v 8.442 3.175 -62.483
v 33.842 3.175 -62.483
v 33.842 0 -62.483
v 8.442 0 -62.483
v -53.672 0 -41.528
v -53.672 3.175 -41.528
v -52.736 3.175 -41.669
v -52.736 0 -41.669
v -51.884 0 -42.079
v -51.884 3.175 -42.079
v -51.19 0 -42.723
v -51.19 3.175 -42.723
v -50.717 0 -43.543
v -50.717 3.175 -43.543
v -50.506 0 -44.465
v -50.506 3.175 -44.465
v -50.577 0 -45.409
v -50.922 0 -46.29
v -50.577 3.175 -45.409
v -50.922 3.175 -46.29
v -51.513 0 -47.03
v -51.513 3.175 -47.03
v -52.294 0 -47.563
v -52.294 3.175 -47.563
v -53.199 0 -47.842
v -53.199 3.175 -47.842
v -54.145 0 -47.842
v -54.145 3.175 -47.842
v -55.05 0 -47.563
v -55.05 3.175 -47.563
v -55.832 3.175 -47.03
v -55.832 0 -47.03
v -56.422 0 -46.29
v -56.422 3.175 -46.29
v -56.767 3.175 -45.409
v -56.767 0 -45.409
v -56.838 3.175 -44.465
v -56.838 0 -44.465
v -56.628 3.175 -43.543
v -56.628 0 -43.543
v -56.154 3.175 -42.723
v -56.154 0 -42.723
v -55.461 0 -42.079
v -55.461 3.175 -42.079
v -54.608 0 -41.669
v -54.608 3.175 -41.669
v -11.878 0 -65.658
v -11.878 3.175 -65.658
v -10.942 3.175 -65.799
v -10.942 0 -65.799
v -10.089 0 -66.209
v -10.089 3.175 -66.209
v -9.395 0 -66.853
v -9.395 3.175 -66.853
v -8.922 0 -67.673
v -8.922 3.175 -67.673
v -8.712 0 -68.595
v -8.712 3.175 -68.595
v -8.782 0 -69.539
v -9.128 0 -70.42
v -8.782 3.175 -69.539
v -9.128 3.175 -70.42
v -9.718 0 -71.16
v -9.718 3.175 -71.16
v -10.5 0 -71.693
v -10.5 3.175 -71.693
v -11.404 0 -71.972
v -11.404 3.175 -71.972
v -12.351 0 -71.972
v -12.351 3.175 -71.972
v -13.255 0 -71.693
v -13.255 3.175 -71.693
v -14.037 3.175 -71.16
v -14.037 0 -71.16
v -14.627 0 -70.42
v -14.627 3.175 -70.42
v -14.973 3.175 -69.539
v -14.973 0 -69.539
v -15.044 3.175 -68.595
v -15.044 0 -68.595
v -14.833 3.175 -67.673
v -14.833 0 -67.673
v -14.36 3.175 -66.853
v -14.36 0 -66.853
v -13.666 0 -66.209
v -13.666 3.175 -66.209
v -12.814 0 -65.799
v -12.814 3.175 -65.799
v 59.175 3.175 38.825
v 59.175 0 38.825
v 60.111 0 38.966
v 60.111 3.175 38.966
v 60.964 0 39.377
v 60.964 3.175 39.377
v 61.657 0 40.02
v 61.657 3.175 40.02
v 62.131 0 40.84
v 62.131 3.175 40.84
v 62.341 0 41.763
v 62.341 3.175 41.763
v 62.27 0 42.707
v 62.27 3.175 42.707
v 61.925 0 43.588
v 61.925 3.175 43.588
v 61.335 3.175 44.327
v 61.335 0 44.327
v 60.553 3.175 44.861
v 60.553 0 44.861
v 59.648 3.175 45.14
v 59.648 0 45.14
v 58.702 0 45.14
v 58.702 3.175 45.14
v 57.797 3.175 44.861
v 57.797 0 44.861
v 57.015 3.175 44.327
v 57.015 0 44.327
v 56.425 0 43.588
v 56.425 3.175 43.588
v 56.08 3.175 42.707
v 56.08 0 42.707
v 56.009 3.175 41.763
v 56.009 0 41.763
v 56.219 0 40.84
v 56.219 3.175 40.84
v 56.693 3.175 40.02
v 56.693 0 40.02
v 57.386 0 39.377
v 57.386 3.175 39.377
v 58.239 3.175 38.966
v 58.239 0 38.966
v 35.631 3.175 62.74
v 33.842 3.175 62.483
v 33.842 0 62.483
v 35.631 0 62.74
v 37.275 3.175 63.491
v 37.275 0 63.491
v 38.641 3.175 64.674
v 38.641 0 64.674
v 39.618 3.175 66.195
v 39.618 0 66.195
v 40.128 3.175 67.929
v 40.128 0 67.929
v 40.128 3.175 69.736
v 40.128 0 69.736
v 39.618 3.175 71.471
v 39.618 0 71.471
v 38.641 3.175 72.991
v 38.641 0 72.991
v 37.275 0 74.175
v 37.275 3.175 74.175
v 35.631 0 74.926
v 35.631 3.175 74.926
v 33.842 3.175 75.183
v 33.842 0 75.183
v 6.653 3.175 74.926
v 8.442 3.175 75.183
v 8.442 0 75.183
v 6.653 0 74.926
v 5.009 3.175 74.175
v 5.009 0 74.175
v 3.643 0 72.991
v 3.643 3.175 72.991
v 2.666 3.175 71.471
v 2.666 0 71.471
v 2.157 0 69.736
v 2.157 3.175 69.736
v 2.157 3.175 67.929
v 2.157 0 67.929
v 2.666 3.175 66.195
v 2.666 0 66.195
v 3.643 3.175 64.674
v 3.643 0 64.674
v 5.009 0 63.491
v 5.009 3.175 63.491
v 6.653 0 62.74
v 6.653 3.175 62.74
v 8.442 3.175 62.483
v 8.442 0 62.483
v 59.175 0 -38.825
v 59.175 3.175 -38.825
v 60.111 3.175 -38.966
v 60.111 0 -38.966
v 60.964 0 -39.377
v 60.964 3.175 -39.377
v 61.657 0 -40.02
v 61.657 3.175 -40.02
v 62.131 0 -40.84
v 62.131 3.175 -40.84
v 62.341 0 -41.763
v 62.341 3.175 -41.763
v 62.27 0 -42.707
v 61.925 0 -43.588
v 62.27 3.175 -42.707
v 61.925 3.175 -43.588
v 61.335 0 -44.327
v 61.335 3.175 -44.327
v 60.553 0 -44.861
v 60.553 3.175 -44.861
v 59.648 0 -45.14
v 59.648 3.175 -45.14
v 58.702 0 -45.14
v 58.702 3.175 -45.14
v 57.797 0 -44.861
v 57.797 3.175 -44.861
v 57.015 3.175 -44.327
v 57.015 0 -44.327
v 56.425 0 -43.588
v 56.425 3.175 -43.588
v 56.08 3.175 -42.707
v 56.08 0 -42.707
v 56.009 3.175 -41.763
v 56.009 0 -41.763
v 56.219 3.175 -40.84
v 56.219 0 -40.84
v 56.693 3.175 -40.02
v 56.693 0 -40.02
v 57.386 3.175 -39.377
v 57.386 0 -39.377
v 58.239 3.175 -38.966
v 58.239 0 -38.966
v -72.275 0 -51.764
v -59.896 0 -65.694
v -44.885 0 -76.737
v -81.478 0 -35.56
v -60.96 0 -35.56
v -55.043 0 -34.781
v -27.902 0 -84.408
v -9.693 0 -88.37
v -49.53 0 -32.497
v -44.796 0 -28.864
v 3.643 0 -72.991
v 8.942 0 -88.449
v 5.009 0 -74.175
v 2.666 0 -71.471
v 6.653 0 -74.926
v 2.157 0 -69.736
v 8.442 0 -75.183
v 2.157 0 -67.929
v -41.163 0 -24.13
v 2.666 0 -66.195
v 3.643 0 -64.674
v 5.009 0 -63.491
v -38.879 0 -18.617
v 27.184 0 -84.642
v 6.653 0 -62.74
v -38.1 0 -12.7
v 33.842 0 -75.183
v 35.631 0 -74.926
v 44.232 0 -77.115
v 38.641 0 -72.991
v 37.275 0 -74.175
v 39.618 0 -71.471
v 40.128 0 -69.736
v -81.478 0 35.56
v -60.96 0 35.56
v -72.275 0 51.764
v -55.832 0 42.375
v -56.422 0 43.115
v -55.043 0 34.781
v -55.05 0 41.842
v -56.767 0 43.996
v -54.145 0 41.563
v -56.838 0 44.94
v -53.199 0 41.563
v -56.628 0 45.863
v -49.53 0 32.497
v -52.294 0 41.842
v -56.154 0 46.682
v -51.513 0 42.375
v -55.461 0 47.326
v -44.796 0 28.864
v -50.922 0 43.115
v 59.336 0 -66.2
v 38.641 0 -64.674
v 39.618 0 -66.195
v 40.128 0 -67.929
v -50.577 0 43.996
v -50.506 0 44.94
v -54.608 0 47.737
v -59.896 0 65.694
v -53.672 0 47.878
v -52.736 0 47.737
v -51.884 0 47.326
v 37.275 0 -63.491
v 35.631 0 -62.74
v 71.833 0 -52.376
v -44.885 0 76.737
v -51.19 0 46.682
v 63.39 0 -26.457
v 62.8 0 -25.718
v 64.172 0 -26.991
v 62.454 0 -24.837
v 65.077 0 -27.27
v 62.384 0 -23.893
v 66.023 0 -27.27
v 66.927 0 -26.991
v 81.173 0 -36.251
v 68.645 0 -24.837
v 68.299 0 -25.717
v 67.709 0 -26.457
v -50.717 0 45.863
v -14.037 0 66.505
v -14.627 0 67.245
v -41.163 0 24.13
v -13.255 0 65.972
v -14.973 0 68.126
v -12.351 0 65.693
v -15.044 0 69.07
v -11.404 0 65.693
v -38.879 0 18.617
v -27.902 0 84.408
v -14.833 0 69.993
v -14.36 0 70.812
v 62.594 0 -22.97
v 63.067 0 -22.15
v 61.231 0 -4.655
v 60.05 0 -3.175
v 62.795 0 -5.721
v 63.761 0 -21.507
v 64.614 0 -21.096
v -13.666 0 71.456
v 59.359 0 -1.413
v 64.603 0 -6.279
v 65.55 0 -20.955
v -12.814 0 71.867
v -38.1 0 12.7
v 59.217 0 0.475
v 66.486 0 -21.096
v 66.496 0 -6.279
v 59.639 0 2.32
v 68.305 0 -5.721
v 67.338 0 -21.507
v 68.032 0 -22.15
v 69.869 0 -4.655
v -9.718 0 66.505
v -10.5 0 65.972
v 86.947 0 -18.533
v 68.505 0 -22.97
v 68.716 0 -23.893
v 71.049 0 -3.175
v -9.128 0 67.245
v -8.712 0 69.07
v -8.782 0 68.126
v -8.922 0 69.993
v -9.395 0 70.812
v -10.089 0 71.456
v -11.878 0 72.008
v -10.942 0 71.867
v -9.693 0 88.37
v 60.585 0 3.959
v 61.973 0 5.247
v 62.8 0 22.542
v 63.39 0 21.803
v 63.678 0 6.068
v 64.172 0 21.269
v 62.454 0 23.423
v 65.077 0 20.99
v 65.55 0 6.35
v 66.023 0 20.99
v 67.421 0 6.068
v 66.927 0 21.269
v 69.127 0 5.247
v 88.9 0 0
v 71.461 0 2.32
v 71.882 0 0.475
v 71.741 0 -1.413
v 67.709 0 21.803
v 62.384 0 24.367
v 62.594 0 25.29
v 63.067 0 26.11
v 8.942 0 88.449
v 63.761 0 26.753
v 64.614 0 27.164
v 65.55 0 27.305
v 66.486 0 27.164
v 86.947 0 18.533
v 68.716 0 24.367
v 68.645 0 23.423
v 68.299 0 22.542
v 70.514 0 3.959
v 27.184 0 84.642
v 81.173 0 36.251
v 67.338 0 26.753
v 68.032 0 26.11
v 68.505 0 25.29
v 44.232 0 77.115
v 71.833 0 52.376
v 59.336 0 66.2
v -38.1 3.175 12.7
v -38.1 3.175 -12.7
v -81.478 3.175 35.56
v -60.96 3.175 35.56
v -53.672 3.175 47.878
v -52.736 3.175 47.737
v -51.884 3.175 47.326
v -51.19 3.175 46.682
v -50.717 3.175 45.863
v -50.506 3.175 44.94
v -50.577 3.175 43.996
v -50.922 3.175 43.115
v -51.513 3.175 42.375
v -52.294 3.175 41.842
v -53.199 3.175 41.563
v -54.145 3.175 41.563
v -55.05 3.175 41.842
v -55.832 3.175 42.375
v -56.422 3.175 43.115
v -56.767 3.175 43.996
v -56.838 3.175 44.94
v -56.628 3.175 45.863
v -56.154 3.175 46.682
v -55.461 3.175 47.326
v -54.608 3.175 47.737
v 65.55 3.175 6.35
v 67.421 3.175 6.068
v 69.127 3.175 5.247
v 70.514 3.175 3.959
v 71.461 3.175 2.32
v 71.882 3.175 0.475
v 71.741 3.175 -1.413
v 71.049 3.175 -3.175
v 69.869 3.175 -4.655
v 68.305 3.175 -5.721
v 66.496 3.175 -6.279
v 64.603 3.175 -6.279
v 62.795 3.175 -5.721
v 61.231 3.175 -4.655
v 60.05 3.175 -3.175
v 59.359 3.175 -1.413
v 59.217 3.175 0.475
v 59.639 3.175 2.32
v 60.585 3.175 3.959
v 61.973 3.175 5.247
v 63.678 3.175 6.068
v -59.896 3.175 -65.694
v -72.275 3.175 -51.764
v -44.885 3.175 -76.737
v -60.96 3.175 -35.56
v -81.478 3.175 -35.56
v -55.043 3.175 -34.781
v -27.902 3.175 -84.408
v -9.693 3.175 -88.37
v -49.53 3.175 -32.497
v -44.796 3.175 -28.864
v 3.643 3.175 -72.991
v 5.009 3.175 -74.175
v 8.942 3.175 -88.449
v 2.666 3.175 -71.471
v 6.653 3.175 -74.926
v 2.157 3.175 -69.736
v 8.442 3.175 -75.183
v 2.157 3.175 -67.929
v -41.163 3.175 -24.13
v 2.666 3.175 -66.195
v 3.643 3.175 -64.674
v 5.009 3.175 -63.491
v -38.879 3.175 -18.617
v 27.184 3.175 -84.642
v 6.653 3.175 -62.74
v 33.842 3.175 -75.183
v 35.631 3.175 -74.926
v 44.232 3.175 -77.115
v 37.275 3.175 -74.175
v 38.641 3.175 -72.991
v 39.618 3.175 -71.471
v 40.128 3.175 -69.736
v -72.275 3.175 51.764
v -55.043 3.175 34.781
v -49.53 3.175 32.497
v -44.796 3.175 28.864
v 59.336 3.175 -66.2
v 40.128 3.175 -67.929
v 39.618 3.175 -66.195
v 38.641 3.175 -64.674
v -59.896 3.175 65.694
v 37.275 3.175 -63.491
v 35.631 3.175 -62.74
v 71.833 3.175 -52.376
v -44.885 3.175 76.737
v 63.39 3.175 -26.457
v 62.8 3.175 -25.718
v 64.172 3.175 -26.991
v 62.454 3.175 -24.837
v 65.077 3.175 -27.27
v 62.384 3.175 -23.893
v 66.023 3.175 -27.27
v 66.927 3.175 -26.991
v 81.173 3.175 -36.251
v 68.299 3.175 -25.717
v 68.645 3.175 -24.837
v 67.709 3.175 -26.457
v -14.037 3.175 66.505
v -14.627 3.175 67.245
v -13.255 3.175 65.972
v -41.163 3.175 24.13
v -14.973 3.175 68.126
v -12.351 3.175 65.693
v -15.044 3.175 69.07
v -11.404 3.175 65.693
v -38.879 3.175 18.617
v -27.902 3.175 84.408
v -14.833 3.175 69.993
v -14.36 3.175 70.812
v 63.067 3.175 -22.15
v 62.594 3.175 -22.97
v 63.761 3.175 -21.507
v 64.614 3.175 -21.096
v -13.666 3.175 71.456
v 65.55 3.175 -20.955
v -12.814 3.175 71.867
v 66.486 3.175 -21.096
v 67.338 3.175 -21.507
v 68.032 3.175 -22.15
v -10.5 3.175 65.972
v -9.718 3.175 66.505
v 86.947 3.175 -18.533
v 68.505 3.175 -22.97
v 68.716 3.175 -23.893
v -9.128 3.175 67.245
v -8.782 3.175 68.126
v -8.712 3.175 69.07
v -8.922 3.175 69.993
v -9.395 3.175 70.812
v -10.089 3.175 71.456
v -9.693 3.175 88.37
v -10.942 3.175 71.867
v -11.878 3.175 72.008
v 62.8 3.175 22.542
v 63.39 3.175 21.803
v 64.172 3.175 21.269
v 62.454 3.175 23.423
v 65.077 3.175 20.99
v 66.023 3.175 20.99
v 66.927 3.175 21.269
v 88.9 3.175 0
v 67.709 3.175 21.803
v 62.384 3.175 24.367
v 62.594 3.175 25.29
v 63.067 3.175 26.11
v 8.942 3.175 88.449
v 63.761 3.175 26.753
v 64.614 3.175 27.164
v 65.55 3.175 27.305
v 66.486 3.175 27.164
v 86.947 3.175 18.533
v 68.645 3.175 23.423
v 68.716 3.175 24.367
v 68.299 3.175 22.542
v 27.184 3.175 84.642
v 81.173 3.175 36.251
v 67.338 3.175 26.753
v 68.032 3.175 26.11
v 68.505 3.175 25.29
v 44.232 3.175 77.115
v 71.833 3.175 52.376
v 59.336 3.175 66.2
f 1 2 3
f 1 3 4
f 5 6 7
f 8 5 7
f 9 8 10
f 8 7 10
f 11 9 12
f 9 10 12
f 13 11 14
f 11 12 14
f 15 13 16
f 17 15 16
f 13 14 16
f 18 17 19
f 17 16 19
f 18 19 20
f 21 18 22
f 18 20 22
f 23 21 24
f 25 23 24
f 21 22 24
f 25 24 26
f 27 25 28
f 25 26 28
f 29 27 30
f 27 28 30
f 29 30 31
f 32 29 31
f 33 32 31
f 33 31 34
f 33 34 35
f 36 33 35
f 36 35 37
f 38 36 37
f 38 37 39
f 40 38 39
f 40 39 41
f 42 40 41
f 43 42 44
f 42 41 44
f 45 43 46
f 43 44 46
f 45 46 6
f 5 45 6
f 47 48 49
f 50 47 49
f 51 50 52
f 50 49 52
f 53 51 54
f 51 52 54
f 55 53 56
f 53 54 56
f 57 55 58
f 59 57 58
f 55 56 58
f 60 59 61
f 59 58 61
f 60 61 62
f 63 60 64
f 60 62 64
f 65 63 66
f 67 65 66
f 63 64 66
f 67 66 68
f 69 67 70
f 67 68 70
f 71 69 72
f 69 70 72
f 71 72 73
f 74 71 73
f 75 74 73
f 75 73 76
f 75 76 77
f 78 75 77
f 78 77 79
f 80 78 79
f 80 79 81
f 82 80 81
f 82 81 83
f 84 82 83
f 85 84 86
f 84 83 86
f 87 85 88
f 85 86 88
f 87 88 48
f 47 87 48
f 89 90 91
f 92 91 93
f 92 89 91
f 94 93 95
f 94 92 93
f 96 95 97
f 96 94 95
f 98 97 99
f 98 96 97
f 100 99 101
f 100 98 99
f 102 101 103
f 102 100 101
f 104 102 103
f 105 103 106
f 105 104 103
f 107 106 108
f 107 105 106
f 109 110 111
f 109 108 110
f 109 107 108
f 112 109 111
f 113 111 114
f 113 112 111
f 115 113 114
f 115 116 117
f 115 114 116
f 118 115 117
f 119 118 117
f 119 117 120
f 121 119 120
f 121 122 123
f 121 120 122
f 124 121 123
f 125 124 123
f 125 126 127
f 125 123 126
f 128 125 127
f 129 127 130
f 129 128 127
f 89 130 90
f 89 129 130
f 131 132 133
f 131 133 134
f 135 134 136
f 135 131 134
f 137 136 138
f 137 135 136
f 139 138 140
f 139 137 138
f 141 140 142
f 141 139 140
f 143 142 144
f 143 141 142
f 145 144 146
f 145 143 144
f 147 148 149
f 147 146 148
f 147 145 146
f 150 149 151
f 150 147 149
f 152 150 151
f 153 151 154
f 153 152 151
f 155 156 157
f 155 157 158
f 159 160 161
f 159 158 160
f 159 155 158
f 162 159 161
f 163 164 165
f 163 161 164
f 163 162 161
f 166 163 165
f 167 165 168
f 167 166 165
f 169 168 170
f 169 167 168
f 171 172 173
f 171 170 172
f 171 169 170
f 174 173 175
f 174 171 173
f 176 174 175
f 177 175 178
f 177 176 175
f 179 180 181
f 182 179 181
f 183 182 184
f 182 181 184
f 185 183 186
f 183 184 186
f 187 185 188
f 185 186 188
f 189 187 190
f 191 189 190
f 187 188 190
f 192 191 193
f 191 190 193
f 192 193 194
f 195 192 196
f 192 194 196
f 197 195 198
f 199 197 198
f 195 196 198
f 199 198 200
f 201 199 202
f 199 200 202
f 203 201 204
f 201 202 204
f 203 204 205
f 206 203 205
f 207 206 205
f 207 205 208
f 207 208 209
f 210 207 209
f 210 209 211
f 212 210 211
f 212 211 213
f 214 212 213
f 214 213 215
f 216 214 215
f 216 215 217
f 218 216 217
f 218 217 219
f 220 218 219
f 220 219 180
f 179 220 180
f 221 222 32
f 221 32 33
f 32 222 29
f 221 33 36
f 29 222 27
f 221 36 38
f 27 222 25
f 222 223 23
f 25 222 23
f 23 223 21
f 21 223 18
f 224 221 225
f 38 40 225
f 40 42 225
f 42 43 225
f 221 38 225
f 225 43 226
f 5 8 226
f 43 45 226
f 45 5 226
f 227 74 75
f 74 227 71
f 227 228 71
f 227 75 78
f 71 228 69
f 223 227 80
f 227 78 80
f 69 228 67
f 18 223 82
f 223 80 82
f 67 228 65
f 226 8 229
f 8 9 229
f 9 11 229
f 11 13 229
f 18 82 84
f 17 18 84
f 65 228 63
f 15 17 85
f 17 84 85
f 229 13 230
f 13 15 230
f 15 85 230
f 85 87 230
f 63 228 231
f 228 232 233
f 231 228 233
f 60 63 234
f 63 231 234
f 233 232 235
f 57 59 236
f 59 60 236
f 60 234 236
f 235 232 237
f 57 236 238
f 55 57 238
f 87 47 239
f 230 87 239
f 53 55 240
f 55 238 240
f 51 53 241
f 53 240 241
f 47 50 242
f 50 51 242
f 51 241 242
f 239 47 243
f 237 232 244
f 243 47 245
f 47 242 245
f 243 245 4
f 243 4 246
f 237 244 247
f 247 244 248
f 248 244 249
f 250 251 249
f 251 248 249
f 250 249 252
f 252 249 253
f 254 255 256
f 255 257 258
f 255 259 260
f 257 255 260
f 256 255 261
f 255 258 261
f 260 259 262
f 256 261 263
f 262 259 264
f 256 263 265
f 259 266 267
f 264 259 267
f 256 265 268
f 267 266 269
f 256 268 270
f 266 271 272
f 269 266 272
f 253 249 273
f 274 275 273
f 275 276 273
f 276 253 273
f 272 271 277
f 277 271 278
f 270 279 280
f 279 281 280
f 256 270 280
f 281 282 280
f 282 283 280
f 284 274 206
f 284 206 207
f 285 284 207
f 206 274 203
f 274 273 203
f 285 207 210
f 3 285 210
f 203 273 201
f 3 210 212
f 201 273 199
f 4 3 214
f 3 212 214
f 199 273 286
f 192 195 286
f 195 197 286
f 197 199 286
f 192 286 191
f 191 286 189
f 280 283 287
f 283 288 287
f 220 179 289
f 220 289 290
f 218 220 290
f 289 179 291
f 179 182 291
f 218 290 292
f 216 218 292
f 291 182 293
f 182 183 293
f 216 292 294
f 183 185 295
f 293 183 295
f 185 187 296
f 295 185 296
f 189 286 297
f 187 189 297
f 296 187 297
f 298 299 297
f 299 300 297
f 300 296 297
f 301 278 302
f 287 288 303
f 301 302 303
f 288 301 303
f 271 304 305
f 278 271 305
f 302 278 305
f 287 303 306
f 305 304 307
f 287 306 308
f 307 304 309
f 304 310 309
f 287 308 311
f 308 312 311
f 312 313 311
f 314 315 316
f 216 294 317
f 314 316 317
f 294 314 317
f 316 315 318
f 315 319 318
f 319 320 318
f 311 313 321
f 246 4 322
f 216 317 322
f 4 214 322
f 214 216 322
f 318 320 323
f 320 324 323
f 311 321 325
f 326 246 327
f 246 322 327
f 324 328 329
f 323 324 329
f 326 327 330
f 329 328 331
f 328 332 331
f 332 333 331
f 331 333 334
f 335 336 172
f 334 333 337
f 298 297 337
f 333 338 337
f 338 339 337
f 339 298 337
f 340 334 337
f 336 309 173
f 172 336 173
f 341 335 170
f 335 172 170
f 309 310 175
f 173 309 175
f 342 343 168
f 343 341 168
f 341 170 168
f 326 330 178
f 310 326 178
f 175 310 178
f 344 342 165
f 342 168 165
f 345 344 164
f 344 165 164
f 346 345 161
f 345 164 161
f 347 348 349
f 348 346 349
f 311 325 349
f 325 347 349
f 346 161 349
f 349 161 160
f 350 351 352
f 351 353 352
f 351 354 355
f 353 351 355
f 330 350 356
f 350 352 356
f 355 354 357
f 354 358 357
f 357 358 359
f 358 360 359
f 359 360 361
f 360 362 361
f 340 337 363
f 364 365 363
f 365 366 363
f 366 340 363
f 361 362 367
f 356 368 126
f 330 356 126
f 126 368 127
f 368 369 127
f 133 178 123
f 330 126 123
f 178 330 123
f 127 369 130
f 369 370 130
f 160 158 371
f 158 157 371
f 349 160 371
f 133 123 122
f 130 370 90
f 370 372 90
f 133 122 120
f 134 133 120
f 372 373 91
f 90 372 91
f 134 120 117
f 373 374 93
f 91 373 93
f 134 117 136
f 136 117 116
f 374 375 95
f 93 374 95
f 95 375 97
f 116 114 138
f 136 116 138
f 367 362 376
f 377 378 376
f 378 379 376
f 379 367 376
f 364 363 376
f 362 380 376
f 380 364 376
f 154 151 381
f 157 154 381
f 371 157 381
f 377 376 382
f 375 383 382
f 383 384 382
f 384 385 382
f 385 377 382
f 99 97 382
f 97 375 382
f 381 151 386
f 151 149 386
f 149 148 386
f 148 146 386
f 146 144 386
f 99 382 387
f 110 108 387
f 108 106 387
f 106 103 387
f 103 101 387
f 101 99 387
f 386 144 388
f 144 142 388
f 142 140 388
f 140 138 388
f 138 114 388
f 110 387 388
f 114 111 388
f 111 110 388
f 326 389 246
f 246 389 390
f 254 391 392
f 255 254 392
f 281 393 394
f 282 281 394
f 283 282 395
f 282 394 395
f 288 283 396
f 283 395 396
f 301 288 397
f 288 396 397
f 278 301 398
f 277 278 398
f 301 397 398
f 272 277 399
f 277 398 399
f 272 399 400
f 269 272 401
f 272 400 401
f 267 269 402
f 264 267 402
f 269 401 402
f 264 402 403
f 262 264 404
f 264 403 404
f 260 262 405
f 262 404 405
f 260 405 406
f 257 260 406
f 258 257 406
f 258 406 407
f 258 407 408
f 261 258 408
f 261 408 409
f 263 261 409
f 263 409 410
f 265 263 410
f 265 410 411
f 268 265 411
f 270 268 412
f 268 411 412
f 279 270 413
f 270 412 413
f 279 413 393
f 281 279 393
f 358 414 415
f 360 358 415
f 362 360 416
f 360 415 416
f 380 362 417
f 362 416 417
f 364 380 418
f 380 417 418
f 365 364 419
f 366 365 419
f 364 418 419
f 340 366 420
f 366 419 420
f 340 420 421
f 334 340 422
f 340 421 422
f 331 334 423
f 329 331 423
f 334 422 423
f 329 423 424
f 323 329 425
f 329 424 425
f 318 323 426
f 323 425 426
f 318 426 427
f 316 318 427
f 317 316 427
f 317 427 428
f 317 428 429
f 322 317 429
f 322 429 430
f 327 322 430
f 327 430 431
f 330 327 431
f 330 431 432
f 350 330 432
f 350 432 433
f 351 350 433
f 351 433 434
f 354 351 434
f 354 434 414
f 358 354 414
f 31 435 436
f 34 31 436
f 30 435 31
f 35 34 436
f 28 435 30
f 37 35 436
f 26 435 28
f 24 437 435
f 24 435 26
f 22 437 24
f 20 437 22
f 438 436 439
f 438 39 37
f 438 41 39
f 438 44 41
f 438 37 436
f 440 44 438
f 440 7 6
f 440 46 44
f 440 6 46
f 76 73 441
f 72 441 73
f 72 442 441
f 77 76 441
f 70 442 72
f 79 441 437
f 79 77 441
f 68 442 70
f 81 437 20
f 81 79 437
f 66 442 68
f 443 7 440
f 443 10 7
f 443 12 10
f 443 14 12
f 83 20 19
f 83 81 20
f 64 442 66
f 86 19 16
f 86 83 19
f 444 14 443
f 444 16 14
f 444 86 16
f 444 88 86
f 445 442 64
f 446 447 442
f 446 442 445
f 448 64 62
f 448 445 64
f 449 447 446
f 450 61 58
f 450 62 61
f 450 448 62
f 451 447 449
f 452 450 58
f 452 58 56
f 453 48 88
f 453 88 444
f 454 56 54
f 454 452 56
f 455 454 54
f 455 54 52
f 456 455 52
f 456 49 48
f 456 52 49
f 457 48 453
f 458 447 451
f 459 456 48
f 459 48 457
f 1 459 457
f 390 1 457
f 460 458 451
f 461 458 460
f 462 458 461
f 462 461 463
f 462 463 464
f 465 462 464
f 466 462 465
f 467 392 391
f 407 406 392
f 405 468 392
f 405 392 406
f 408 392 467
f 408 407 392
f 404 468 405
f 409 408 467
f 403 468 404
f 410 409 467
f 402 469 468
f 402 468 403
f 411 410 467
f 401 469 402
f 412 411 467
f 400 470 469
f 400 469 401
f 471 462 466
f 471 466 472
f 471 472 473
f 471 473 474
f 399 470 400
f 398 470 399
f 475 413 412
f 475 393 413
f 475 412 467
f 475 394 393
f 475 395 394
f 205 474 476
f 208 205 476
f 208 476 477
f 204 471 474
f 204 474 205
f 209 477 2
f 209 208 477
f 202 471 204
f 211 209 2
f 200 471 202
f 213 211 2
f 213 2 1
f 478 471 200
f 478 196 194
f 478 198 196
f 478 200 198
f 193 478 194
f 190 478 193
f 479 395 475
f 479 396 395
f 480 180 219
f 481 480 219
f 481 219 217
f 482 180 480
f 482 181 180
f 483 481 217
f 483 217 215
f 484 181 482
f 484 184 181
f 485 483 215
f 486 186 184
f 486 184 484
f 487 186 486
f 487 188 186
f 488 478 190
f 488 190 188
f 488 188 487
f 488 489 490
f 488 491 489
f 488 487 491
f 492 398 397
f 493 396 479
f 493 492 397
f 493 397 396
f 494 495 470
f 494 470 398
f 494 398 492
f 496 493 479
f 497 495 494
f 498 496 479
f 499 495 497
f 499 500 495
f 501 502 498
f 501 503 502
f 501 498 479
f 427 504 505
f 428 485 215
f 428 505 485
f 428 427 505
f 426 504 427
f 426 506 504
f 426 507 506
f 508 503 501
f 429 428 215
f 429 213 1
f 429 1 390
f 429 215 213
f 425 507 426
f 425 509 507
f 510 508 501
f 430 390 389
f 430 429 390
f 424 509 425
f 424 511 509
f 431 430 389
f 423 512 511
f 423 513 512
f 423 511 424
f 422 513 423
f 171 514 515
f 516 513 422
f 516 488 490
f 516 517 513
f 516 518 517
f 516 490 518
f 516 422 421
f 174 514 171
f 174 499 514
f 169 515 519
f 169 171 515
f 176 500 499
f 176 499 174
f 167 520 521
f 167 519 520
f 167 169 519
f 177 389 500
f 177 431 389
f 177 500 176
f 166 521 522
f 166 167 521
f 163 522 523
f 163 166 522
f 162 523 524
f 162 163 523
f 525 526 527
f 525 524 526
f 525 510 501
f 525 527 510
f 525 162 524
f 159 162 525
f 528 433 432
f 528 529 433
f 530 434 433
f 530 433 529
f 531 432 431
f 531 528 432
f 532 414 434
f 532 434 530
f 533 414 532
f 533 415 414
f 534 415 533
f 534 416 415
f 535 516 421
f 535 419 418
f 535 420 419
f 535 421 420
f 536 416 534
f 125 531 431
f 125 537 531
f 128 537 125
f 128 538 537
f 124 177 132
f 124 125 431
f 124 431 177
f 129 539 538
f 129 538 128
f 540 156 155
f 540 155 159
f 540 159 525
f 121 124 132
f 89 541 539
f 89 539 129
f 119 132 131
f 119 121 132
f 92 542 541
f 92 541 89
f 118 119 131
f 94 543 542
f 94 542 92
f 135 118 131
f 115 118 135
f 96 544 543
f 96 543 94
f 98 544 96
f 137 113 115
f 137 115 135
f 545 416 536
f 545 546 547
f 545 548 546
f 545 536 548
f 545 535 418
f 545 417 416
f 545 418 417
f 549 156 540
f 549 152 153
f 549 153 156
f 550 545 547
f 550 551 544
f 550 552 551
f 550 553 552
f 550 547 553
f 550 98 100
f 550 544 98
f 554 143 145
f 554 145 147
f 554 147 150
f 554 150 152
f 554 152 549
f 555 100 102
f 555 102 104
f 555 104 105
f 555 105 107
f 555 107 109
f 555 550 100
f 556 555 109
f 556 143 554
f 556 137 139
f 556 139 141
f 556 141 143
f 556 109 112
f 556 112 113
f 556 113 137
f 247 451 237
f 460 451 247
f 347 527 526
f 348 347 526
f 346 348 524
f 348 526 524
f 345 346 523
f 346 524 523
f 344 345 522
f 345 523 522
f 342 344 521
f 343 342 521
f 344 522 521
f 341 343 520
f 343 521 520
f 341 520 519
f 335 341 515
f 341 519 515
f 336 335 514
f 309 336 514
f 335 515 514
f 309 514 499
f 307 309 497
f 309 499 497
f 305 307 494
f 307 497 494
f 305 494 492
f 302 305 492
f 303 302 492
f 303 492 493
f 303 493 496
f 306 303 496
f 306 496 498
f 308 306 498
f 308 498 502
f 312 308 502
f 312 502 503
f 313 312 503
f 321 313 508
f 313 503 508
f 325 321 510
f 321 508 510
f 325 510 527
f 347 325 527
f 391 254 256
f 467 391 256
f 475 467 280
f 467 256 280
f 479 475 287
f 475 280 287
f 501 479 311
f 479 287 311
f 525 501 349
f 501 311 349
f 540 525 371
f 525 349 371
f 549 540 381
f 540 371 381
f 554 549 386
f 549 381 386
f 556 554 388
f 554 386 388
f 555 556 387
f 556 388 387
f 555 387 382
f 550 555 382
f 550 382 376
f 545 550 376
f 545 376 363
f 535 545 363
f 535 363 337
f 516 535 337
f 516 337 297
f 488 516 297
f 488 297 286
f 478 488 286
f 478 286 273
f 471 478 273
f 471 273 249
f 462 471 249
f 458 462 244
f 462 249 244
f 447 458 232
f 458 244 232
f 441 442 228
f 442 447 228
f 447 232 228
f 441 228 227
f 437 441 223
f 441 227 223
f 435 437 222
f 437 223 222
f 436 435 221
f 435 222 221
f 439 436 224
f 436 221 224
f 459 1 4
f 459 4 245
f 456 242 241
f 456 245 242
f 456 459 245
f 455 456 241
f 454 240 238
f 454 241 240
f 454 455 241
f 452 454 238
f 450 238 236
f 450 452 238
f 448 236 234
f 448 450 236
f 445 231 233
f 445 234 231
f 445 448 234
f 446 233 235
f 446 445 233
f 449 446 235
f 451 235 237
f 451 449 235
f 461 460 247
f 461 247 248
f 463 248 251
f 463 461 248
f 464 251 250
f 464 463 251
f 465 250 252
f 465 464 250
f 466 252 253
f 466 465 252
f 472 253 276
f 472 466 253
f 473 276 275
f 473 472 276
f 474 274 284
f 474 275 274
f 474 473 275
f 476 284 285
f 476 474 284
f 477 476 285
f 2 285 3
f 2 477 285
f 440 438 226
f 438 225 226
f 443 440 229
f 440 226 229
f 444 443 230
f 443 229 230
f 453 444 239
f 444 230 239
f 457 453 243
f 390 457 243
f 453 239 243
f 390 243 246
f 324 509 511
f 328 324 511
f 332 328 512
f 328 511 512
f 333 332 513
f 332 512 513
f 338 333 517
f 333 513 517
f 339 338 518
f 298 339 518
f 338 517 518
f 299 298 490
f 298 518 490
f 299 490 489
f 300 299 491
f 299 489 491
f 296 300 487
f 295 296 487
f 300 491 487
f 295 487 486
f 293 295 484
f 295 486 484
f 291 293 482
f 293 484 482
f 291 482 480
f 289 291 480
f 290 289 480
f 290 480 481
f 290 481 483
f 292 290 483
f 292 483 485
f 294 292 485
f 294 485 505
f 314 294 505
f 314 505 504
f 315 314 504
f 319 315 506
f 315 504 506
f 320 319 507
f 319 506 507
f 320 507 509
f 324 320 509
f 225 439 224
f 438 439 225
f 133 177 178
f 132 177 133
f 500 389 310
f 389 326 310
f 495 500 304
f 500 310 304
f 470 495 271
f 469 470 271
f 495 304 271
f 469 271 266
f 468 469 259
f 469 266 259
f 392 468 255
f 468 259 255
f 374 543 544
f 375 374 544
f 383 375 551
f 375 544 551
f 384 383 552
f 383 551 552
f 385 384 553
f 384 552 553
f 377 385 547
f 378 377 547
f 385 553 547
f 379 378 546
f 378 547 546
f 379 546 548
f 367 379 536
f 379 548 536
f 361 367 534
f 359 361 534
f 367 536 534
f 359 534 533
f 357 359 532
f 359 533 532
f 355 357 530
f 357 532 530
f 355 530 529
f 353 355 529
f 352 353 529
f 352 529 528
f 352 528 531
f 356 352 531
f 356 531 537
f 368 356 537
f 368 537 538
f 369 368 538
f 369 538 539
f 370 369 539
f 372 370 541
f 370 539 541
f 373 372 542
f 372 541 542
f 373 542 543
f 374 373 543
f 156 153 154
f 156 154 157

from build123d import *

# Parameters (mm, degrees)
SKETCH2_R           = 88.9
BOSS_EXTRUDE1_DEPTH = 3.175
SKETCH3_R           = 3.175
SKETCH3_W           = 50.8
SKETCH3_H           = 71.12
CUT_EXTRUDE1_DEPTH  = 3.175
FILLET1_R           = 22.86
SKETCH6_R           = 6.35
CUT_EXTRUDE3_DEPTH  = 126.763669734
SKETCH8_R           = 3.175
CUT_EXTRUDE4_DEPTH  = 10


with BuildPart() as part:
    # Sketch2 → Boss-Extrude1 (new body)
    with BuildSketch(Plane(origin=(0, 0, 0), x_dir=(1, 0, 0), z_dir=(0, 1, 0))):
        with Locations(Location((0, 0, 0), (0, 0, 270))):
            Circle(SKETCH2_R)
    extrude(amount=BOSS_EXTRUDE1_DEPTH)

    # Sketch3 → Cut-Extrude1 (cut)
    with BuildSketch(Plane(origin=(0, 3.175, 0), x_dir=(1, 0, 0), z_dir=(0, 1, 0))):
        with Locations(Location((65.549718535, -24.13, 0), (0, 0, 270))):
            Circle(SKETCH3_R)
        with Locations(Location((65.549718535, 24.13, 0), (0, 0, 270))):
            Circle(SKETCH3_R)
        with Locations(Location((-53.672052261, 44.702721462, 0), (0, 0, 270))):
            Circle(SKETCH3_R)
        with Locations(Location((-11.877666274, 68.832721462, 0), (0, 0, 270))):
            Circle(SKETCH3_R)
        with Locations(Location((-11.877666274, -68.832721462, 0), (0, 0, 270))):
            Circle(SKETCH3_R)
        with Locations(Location((-53.672052261, -44.702721462, 0), (0, 0, 270))):
            Circle(SKETCH3_R)
        with Locations((-63.5, 0)):
            Rectangle(SKETCH3_W, SKETCH3_H)
    extrude(amount=-CUT_EXTRUDE1_DEPTH, mode=Mode.SUBTRACT)

    # Fillet1
    fillet1_edges = [part.edges().sort_by_distance(p)[0] for p in [
        (-38.1, 1.5875, 35.56),
        (-38.1, 1.5875, -35.56),
    ]]
    fillet(fillet1_edges, radius=FILLET1_R)

    # Sketch6 → Cut-Extrude3 (cut, through all)
    with BuildSketch(Plane(origin=(0, 3.175, 0), x_dir=(1, 0, 0), z_dir=(0, 1, 0))):
        with Locations(Location((65.549718535, 0, 0), (0, 0, 270))):
            Circle(SKETCH6_R)
        with BuildLine():
            Line((8.442333726, 75.182721462), (33.842333726, 75.182721462))
            ThreePointArc((33.842333726, 75.182721462), (40.192333726, 68.832721462), (33.842333726, 62.482721462))
            Line((33.842333726, 62.482721462), (8.442333726, 62.482721462))
            ThreePointArc((8.442333726, 62.482721462), (2.092333726, 68.832721462), (8.442333726, 75.182721462))
        make_face()
        with BuildLine():
            Line((8.442333726, -62.482721462), (33.842333726, -62.482721462))
            ThreePointArc((33.842333726, -62.482721462), (40.192333726, -68.832721462), (33.842333726, -75.182721462))
            Line((33.842333726, -75.182721462), (8.442333726, -75.182721462))
            ThreePointArc((8.442333726, -75.182721462), (2.092333726, -68.832721462), (8.442333726, -62.482721462))
        make_face()
    extrude(amount=-CUT_EXTRUDE3_DEPTH, mode=Mode.SUBTRACT)

    # Sketch8 → Cut-Extrude4 (cut)
    with BuildSketch(Plane(origin=(0, 3.175, 0), x_dir=(1, 0, 0), z_dir=(0, 1, 0))):
        with Locations(Location((59.175, 42, 0), (0, 0, 270))):
            Circle(SKETCH8_R)
    cut_extrude4 = extrude(amount=-CUT_EXTRUDE4_DEPTH, mode=Mode.SUBTRACT)

    # Mirror1: Cut-Extrude4 across plane
    add(cut_extrude4.mirror(Plane.XY), mode=Mode.SUBTRACT)


solid = part.part
